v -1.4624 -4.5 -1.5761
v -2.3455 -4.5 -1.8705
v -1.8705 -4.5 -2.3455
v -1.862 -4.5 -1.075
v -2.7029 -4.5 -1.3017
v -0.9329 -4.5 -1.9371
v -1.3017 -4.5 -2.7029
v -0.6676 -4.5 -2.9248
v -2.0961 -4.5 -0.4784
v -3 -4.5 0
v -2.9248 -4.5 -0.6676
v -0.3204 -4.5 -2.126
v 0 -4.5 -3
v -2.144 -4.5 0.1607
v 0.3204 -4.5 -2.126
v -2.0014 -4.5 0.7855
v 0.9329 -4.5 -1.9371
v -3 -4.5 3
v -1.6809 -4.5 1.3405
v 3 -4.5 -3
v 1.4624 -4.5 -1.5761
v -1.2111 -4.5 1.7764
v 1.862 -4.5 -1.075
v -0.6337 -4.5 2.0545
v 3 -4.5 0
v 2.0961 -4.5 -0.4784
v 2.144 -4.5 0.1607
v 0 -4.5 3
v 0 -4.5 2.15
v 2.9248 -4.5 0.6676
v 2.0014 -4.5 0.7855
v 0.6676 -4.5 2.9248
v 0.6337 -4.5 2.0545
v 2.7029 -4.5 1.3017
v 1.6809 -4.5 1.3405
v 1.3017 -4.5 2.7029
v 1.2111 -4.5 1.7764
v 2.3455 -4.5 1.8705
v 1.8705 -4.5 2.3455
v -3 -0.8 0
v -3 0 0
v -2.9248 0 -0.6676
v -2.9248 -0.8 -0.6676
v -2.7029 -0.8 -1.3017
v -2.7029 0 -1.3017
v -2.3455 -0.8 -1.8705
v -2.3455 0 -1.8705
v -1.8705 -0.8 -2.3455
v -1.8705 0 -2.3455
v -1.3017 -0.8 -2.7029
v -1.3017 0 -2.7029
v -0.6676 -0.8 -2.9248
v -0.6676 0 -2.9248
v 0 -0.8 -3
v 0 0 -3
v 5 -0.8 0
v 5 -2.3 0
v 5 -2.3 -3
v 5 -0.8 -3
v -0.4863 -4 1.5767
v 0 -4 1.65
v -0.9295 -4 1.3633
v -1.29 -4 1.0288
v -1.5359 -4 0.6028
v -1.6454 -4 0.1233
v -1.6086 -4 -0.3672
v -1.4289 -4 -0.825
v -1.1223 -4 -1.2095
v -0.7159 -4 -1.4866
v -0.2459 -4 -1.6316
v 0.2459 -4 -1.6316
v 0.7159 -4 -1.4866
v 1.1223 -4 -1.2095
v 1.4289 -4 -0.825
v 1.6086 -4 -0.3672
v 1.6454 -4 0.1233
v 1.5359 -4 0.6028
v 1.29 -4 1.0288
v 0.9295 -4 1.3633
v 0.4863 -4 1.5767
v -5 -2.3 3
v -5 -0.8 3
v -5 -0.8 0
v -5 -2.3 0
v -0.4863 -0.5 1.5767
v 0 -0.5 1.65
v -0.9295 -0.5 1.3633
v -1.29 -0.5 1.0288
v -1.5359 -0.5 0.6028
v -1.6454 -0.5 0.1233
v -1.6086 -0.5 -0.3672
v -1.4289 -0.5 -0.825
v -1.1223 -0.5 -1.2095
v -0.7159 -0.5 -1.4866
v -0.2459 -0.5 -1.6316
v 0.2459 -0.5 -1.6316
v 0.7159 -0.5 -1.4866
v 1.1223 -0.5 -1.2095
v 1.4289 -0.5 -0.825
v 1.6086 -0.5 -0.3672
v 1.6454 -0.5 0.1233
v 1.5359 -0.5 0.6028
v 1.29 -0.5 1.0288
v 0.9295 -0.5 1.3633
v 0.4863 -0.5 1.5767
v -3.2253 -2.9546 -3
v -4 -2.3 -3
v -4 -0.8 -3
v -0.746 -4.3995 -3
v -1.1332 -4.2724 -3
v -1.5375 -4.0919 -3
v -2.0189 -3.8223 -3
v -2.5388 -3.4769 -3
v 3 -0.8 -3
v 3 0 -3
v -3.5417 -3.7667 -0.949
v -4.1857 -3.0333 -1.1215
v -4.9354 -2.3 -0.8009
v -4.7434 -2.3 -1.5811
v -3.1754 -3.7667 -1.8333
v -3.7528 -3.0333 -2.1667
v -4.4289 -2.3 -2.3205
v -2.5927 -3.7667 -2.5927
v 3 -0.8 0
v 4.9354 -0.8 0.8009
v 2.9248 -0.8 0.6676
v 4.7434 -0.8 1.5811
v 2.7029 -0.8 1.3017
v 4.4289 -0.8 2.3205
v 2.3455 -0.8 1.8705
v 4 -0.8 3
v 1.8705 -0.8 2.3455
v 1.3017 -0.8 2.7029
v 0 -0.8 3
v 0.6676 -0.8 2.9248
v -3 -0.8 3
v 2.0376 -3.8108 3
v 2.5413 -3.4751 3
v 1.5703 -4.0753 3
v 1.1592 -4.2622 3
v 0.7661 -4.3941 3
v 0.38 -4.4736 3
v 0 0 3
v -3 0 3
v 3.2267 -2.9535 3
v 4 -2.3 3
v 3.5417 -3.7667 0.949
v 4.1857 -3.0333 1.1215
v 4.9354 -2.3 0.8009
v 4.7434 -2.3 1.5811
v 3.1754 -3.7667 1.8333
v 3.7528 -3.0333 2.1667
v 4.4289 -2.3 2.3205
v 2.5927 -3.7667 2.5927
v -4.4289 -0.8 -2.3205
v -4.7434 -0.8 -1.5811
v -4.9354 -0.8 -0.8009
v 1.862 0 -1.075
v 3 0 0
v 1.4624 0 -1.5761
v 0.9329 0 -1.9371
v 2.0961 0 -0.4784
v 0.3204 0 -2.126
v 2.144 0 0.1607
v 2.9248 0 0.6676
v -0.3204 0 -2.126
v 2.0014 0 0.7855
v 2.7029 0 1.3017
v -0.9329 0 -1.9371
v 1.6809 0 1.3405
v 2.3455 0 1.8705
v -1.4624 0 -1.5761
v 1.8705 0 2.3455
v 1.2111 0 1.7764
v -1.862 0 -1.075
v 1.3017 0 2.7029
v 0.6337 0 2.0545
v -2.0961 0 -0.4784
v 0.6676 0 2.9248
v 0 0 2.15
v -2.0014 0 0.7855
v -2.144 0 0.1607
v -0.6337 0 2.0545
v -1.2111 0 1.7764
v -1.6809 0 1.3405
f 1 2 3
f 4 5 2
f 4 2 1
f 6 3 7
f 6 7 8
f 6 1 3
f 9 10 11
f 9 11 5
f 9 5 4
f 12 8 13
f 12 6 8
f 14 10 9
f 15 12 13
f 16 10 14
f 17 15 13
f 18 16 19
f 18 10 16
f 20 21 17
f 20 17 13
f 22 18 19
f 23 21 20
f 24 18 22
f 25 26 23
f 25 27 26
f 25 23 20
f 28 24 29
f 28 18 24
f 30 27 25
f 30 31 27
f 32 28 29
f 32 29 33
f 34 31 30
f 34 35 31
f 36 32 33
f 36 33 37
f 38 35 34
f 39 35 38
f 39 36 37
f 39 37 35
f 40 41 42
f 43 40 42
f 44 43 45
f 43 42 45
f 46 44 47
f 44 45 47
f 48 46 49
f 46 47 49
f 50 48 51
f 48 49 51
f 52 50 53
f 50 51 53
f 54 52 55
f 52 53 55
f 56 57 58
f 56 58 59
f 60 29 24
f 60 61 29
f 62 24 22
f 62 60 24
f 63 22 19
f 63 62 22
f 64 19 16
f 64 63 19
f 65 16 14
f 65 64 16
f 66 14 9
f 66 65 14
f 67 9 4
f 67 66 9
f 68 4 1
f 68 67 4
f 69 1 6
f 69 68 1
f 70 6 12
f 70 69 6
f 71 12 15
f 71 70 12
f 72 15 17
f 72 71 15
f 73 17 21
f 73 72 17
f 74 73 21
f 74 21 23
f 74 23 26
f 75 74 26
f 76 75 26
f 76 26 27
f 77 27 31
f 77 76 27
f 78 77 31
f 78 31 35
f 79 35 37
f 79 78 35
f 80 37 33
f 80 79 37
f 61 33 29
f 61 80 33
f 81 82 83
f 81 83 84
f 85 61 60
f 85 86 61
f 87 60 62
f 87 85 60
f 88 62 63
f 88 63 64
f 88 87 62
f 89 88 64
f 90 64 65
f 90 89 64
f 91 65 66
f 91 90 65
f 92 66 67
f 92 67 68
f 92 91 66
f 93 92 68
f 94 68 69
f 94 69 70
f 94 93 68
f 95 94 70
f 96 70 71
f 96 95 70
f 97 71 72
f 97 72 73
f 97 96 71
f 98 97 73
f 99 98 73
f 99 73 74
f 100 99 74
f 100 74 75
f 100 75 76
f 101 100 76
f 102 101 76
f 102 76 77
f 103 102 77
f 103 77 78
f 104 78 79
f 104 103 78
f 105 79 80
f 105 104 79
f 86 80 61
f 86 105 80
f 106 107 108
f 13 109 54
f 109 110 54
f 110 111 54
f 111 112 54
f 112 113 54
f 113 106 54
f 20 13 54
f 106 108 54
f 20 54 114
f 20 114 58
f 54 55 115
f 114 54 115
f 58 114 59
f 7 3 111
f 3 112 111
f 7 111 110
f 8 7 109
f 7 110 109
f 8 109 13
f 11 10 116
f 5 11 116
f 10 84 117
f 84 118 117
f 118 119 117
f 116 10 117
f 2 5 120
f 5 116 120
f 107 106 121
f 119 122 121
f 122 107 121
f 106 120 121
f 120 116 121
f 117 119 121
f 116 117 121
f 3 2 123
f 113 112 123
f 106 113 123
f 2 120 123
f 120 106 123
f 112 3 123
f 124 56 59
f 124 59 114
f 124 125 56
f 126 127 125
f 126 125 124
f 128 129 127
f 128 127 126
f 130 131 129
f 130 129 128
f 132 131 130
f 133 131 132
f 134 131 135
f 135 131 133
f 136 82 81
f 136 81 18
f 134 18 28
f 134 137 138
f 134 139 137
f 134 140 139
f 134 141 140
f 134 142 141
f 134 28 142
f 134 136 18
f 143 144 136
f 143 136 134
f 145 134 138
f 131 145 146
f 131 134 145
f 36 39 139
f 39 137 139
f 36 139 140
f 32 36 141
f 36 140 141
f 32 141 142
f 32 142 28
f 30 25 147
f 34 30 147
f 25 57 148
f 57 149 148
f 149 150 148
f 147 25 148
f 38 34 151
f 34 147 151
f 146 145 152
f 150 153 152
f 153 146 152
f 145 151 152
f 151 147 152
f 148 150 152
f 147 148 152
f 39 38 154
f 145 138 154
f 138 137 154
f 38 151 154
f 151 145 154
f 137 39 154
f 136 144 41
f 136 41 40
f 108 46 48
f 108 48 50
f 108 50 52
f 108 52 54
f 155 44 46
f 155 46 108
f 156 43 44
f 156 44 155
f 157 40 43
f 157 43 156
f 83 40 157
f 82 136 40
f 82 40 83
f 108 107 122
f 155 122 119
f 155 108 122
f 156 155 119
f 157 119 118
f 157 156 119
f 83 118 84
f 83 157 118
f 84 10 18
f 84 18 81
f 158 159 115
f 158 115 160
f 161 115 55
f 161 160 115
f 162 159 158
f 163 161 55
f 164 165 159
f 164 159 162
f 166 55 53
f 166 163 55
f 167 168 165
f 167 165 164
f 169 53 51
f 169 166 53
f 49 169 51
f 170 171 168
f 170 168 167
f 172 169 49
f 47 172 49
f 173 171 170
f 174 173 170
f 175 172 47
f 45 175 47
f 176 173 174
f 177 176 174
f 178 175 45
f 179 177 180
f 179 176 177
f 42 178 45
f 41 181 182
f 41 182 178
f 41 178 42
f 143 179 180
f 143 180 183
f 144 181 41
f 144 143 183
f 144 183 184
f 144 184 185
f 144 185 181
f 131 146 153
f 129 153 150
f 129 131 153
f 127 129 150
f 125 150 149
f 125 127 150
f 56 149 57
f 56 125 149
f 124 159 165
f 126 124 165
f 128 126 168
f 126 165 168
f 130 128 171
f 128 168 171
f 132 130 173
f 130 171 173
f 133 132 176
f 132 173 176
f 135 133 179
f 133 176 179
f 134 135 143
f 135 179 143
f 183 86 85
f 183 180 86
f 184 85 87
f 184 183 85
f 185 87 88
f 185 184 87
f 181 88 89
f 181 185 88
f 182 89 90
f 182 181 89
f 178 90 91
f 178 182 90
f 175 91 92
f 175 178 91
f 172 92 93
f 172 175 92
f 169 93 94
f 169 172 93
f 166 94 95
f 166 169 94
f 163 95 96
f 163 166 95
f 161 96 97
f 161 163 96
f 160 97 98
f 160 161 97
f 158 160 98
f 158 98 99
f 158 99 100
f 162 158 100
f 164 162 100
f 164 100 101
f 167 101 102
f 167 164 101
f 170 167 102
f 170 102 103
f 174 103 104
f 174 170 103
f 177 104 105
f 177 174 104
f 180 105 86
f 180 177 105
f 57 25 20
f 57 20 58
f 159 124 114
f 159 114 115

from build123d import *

# Parameters (mm, degrees)
EXTRUDE_1_DEPTH     = 3
CUT_EXTRUDE_1_DEPTH = 0.8
CUT_EXTRUDE_2_DEPTH = 4.7


with BuildPart() as part:
    # Эскиз1 → Бобышка-Вытянуть1 (new body, symmetric)
    with BuildSketch(Plane.XY):
        Polygon((3, 0), (-3, 0), (-3, -0.8), (-5, -0.8), (-5, -4.5), (5, -4.5), (5, -0.8), (3, -0.8), align=None)
    extrude(amount=EXTRUDE_1_DEPTH, both=True)

    # Эскиз3 → Отверстие обработанное метчиком M41 (revolve, cut)
    with BuildSketch(Plane(origin=(0, 0, 0), x_dir=(0, 0, 1), z_dir=(1, 0, 0))):
        Polygon((0, 0), (0, 4.5), (2.15, 4.5), (1.65, 4), (1.65, 0.5), (2.15, 0), align=None)
    revolve(axis=Axis((0, 6.35, 0), (0, -1, 0)), mode=Mode.SUBTRACT)

    # Эскиз4 → Вырез-Вытянуть1 (cut)
    with BuildSketch(Plane(origin=(0, 0, 0), x_dir=(1, 0, 0), z_dir=(0, 1, 0))):
        with BuildLine():
            Line((-3, 3), (-3, 0))
            ThreePointArc((-3, 0), (-2.121320344, 2.121320344), (0, 3))
            Line((0, 3), (-3, 3))
        make_face()
        with BuildLine():
            Line((0, -3), (3, -3))
            Line((3, -3), (3, 0))
            ThreePointArc((3, 0), (2.121320344, -2.121320344), (0, -3))
        make_face()
    extrude(amount=-CUT_EXTRUDE_1_DEPTH, mode=Mode.SUBTRACT)

    # Эскиз5 → Вырез-Вытянуть2 (cut, through all)
    with BuildSketch(Plane(origin=(0, -0.8, 0), x_dir=(1, 0, 0), z_dir=(0, 1, 0))):
        with BuildLine():
            Line((-5, 0), (-5, 3))
            Line((-5, 3), (-4, 3))
            ThreePointArc((-4, 3), (-4.74341649, 1.58113883), (-5, 0))
        make_face()
        with BuildLine():
            Line((5, 0), (5, -3))
            Line((5, -3), (4, -3))
            ThreePointArc((4, -3), (4.74341649, -1.58113883), (5, 0))
        make_face()
    extrude(amount=-CUT_EXTRUDE_2_DEPTH, mode=Mode.SUBTRACT)

    # Вырез-По траектории1: sweep along a path in Эскиз7
    with BuildLine(Plane.XZ.offset(4.5)) as sweep_1_path:
        Line((0, 5), (-5, 5))
        Line((-5, 5), (-5, 0))
        ThreePointArc((-5, 0), (-3.535533906, -3.535533906), (0, -5))
        Line((0, -5), (5, -5))
        Line((5, -5), (5, 0))
        ThreePointArc((5, 0), (3.535533906, 3.535533906), (0, 5))
    # Эскиз6 → Вырез-По траектории1 (sweep, cut)
    with BuildSketch(Plane.XY.offset(3)):
        Polygon((-5, -2.3), (-5, -4.5), (-3, -4.5), align=None)
    sweep(path=sweep_1_path.line, transition=Transition.RIGHT, mode=Mode.SUBTRACT)


solid = part.part
